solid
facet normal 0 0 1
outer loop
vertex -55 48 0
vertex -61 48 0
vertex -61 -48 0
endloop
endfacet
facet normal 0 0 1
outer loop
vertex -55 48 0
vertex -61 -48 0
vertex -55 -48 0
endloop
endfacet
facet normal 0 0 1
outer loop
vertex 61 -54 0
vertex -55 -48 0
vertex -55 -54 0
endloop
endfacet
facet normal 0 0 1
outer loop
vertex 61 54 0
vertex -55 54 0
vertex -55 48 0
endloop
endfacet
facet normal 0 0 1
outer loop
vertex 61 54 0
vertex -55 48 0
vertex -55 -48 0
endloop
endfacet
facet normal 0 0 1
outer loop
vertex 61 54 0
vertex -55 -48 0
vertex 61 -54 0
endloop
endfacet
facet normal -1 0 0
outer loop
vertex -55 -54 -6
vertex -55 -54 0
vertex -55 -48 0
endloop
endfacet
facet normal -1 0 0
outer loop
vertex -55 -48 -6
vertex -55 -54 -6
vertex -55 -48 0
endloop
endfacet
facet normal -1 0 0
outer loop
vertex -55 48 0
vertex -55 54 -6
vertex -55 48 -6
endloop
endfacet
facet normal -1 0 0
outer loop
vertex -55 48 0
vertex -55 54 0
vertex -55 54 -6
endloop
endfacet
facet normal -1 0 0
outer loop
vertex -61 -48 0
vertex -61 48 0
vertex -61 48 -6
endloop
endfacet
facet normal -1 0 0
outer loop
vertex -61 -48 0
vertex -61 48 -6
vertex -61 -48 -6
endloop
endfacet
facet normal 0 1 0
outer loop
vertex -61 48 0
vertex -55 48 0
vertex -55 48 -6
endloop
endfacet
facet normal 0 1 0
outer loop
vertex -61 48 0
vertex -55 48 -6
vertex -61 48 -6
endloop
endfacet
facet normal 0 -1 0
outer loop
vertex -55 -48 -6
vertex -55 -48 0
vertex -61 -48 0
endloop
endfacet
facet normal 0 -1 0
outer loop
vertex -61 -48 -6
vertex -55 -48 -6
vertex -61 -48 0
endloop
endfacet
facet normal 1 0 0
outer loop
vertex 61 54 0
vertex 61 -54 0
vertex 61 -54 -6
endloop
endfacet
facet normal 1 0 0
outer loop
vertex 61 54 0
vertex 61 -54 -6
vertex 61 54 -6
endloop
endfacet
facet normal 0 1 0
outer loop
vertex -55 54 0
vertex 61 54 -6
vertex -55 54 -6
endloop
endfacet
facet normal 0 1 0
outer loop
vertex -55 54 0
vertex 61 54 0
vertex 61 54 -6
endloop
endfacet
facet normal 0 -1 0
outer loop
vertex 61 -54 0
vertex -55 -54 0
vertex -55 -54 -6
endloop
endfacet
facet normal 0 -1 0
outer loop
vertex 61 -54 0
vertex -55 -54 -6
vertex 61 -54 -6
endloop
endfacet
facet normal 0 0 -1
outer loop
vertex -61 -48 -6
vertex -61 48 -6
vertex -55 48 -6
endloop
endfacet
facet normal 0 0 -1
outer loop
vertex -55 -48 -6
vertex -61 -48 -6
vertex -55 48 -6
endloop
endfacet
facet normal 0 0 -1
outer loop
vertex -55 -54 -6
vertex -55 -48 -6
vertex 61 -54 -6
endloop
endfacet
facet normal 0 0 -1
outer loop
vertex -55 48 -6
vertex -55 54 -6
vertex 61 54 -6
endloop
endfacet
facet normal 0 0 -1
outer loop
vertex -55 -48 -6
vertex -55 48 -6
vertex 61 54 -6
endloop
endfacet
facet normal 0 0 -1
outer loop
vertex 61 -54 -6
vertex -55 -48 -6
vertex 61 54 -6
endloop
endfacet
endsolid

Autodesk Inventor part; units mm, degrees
ref_plane "YZ Plane" through (0, 0, 0) normal (1, 0, 0) x (0, 1, 0)
ref_plane "XZ Plane" through (0, 0, 0) normal (0, 1, 0) x (-1, 0, 0)
ref_plane "XY Plane" through (0, 0, 0) normal (0, 0, 1) x (1, 0, 0)
sketch "Skizze1" plane through (0, 0, 0) normal (0, 0, 1) x (1, 0, 0)
  line L0 (-85.4, 0) -> (85.4, 0) projected
  line L1 (0, -75.6) -> (0, 75.6) projected
  line L2 (-61, -54) -> (61, -54)
  line L3 (61, -54) -> (61, 54)
  line L4 (61, 54) -> (-61, 54)
  line L5 (-61, 54) -> (-61, -54)
  line L6 (-61, -54) -> (61, 54) construction
  line L7 (61, -54) -> (-61, 54) construction
  point P0 (0, 0)
  dimension "d0" = 122
  dimension "d1" = 108
extrude "Extrusion1" add sketch "Skizze1" against normal blind 6
sketch "Skizze2" plane through (0, 0, 0) normal (0, 0, 1) x (1, 0, 0)
  line L0 (-61, -54) -> (61, -54) projected
  line L1 (61, -54) -> (61, 54) projected
  line L2 (61, 54) -> (-61, 54) projected
  line L3 (-61, 54) -> (-61, -54) projected
  line L4 (-85.4, 0) -> (85.4, 0) projected
  line L5 (0, -75.6) -> (0, 75.6) projected
  line L6 (-61, 54) -> (-55, 54)
  line L7 (-55, 54) -> (-55, 48)
  line L8 (-55, 48) -> (-61, 48)
  line L9 (-61, 48) -> (-61, 54)
  line L10 (61, -54) -> (-61, -54) projected
  line L11 (-61, -54) -> (-55, -54)
  line L12 (-55, -54) -> (-55, -48)
  line L13 (-55, -48) -> (-61, -48)
  line L14 (-61, -48) -> (-61, -54)
  point P0 (0, 0)
  dimension "d4" = 6
  dimension "d5" = 6
  dimension "d6" = 6
  dimension "d7" = 6
extrude "Extrusion2" cut sketch "Skizze2" against normal blind 6 contours L3 L13 L12 L0 | L3 L2 L7 L8
properties part number "II Bodenplatte kurz" material "PVC, hart"
